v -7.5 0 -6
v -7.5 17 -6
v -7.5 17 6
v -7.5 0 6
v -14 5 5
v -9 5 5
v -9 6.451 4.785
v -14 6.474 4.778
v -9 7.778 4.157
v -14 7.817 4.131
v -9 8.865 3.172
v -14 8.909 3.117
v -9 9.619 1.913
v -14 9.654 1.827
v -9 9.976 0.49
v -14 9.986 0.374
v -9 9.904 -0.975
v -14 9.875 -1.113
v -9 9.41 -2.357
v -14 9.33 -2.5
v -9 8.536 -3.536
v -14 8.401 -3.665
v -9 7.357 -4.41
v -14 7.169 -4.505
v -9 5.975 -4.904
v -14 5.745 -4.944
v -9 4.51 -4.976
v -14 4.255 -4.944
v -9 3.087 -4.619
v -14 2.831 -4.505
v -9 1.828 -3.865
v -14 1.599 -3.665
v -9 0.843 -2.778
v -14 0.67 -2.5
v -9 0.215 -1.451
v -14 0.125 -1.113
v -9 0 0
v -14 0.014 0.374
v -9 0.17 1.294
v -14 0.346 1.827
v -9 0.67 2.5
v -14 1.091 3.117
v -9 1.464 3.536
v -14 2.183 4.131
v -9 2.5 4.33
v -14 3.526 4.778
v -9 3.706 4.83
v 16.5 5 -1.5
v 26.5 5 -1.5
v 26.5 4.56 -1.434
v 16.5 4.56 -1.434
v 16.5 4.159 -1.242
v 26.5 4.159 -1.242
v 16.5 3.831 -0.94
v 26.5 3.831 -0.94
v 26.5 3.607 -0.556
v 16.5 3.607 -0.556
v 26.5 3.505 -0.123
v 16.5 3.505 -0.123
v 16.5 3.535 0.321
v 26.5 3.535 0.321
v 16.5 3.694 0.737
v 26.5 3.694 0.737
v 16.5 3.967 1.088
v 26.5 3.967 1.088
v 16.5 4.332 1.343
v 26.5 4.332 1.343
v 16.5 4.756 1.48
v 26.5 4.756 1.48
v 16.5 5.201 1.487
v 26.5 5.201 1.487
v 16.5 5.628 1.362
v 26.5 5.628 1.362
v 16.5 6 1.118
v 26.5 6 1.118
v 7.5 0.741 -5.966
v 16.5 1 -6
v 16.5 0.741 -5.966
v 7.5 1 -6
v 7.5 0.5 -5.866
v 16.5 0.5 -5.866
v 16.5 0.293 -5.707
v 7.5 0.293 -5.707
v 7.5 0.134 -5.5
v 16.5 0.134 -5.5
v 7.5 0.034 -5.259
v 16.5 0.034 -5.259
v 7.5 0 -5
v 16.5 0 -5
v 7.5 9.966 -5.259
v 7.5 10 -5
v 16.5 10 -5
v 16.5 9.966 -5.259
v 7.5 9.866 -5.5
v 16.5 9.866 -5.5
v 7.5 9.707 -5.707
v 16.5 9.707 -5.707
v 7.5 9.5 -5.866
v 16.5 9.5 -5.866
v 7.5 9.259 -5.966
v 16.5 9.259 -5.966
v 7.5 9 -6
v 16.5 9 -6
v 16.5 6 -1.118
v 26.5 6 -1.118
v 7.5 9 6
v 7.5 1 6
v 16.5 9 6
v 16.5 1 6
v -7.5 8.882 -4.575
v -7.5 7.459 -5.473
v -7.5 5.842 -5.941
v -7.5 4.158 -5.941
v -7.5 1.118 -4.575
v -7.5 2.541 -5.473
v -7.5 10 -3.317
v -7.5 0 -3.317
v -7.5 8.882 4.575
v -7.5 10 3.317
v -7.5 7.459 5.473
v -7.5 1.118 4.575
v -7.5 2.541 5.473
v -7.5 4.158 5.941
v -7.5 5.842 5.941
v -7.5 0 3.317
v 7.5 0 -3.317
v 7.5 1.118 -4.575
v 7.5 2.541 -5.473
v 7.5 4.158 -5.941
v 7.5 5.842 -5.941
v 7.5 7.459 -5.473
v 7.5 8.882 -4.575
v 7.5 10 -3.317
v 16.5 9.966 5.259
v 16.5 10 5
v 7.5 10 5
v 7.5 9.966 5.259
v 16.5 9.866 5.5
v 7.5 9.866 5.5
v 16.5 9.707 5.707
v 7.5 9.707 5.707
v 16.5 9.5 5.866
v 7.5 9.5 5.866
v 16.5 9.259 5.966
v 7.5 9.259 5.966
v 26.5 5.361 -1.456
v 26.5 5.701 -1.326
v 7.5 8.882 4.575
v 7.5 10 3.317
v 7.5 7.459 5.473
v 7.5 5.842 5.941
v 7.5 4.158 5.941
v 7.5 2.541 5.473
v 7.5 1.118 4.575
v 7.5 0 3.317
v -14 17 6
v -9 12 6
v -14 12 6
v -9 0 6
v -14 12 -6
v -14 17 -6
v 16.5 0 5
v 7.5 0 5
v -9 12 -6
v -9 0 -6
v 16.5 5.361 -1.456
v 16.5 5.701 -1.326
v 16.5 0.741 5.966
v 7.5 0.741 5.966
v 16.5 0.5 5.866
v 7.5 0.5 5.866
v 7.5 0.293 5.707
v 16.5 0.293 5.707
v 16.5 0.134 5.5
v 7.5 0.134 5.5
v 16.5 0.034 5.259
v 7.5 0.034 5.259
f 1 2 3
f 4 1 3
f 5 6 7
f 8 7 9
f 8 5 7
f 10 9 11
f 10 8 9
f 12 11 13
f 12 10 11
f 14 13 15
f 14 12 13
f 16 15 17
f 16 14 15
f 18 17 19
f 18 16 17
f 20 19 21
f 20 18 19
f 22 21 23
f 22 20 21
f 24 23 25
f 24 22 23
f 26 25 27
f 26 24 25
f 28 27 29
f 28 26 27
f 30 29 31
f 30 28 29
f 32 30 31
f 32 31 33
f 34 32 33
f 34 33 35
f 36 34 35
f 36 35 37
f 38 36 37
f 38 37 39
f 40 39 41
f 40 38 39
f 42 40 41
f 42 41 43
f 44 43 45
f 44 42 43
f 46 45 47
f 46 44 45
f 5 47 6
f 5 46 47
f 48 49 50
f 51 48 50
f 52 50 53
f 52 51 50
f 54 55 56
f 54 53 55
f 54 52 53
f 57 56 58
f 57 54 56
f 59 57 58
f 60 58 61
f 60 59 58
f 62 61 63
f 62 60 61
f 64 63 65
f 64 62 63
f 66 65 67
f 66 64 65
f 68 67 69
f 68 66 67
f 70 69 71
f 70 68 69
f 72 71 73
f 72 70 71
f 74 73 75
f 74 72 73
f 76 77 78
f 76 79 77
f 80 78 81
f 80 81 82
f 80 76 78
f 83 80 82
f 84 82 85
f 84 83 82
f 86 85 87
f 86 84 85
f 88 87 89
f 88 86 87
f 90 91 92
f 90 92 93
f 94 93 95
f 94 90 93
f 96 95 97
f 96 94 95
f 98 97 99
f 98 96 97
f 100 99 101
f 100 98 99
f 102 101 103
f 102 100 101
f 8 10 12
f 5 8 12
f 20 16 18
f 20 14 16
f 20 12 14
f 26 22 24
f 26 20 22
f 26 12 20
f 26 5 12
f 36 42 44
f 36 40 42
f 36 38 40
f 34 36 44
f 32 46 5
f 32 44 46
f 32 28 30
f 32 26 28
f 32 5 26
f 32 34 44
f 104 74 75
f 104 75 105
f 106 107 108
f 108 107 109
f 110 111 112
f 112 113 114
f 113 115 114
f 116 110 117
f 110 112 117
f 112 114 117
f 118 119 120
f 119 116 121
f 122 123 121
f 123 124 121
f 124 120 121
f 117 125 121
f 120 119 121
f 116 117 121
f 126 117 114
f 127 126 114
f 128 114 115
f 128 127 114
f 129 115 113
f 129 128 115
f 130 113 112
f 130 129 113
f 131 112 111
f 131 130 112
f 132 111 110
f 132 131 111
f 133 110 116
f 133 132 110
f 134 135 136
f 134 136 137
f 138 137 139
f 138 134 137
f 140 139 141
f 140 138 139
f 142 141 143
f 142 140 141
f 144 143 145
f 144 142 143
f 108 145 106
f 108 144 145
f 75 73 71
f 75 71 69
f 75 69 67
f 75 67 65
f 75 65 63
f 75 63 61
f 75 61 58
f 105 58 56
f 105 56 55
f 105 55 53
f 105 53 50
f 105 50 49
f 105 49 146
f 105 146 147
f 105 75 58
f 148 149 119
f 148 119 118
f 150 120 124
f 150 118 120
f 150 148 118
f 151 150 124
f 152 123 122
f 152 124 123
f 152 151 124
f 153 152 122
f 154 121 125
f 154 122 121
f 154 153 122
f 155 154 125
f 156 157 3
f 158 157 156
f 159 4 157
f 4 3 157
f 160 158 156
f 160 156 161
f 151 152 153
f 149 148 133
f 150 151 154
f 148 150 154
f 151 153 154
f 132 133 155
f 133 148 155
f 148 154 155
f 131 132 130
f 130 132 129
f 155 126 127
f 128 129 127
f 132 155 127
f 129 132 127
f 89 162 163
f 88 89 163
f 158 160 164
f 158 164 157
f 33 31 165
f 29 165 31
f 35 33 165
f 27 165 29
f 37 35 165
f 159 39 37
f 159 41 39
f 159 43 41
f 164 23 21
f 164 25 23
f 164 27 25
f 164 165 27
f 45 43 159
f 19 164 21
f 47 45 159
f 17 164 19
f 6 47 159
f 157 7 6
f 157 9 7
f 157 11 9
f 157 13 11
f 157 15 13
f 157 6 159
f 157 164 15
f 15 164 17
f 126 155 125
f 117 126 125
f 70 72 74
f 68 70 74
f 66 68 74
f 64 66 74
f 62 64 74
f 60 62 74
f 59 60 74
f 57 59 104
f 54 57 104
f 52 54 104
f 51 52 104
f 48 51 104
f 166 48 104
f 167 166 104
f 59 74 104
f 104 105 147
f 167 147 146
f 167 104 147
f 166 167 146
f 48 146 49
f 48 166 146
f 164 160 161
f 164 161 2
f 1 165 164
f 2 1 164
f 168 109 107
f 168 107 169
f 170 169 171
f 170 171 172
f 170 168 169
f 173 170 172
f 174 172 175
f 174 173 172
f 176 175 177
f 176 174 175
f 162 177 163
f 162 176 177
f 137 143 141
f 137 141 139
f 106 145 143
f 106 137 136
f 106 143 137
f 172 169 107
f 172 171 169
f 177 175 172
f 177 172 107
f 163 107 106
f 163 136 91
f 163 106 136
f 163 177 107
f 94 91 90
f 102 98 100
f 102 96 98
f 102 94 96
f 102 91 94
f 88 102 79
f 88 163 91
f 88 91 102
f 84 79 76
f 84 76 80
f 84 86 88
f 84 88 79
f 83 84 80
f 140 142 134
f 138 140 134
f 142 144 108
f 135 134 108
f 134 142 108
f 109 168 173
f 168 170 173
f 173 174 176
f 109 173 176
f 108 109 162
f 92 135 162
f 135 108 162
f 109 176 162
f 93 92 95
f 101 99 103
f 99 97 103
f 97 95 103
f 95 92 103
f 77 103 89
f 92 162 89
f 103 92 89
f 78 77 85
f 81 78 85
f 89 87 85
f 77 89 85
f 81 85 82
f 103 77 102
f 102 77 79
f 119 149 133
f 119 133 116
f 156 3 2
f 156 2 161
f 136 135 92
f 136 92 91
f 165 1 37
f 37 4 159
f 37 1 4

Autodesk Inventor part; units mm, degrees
ref_plane "YZ Plane" through (0, 0, 0) normal (1, 0, 0) x (0, 1, 0)
ref_plane "XZ Plane" through (0, 0, 0) normal (0, 1, 0) x (-1, 0, 0)
ref_plane "XY Plane" through (0, 0, 0) normal (0, 0, 1) x (1, 0, 0)
sketch "Sketch1" plane through (0, 0, 0) normal (0, 1, 0) x (-1, 0, 0)
  line L0 (7.5, 6) -> (-7.5, 6)
  line L1 (-7.5, 6) -> (-7.5, -6)
  line L2 (-7.5, -6) -> (7.5, -6)
  line L3 (7.5, -6) -> (7.5, 6)
  line L4 (7.5, 6) -> (-7.5, -6) construction
  line L5 (-7.5, 6) -> (7.5, -6) construction
  line L6 (7.5, 6) -> (14, 6)
  line L7 (14, 6) -> (14, -6)
  line L8 (14, -6) -> (7.5, -6)
  line L9 (7.5, -6) -> (7.5, 6)
  line L10 (-7.5, 6) -> (-16.5, 6)
  line L11 (-16.5, 6) -> (-16.5, -6)
  line L12 (-16.5, -6) -> (-7.5, -6)
  line L13 (-7.5, -6) -> (-7.5, 6)
  point P0 (0, 0)
  dimension "d0" = 6.5
  dimension "d1" = 12
  dimension "d2" = 9
  dimension "d3" = 21.5
extrude "Extrusion1" add sketch "Sketch1" along normal blind 17 contours L6 L7 L8 L3
extrude "Extrusion2" add sketch "Sketch1" along normal blind 10 separate body contours L3 L2 L1 L0
extrude "Extrusion3" add sketch "Sketch1" along normal blind 10 separate body contours L1 L12 L11 L10
sketch "Sketch2" plane through (16.5, 0, 6) normal (1, 0, 0) x (0, 0, -1)
  circle A0 centre (6, 5) radius 1.5
  line L0 (0, 0) -> (0, 17) projected
  line L1 (4.882, 6) -> (7.118, 6)
  line L2 (12, 10) -> (0, 10) projected
  line L3 (12, 0) -> (0, 0) projected
  line L4 (0, 10) -> (0, 0)
  point P0 (6, 0)
  point P1 (0, 5)
  point P2 (6, 6)
  dimension "d10" = 3
  dimension "d11" = 1
  dimension "d12" = 5
extrude "Extrusion4" add sketch "Sketch2" along normal blind 10 separate body contours A0 L1 picked at (6.0594, 5.1702)
sketch "Sketch3" plane through (-14, 0, -6) normal (-1, 0, 0) x (0, 0, 1)
  line L0 (0, 0) -> (0, 17) projected
  line L1 (0, 12) -> (12, 12)
  line L2 (12, 0) -> (12, 17) projected
  line L3 (0, 17) -> (12, 17) projected
  arc A0 (4.882, 6) -> (7.118, 6) centre (6, 5) ccw projected
  circle A1 centre (6, 5) radius 5
  line L4 (0, 12) -> (0, 0)
  line L5 (12, 0) -> (12, 12)
  line L6 (12, 12) -> (12, 0)
  line L7 (0, 0) -> (12, 0)
  line L8 (0, 0) -> (0, 12)
  point P0 (6, 0)
  point P1 (6, 0)
  dimension "d15" = 5
  dimension "d16" = 10
extrude "Extrusion5" cut sketch "Sketch3" against normal blind 5 contours L0 L1 L2 L7 bodies 1
fillet "Fillet1" radius 1 4 edges at (12, 0, 6) (12, 10, 6) (12, 10, -6) (12, 0, -6)
sketch "Sketch4" plane through (7.5, 0, 6) normal (1, 0, 0) x (0, 0, -1)
  arc A0 (4.882, 6) -> (7.118, 6) centre (6, 5) ccw projected
  circle A1 centre (6, 5) radius 6
  line L0 (0, 0) -> (0, 17) projected
  line L1 (0, 10.0481) -> (0, 0)
  line L2 (0, 0) -> (13.8807, 0)
  line L3 (0, 0) -> (12, 0)
  line L4 (12, 0) -> (12, 17) projected
  line L5 (0, 10) -> (12, 10) projected
  line L6 (0, 0) -> (12, 0) projected
  line L7 (12, 0) -> (12, 10) projected
  line L8 (0, 10) -> (12, 10) projected
  line L9 (0, 0) -> (0, 10) projected
  point P0 (6, 0)
  point P1 (2.6834, 10)
  point P2 (0, 5)
  point P3 (2.6834, 0)
  point P4 (9.3166, 10)
  point P5 (12, 5)
  point P6 (9.3166, 0)
  dimension "d20" = 12
extrude "Extrusion6" cut sketch "Sketch4" against normal up to next contours L4 L2 A1 | A1 L5 L4 | A1 L0 L5 | L2 L0 A1 bodies 2
equation "\"d12\" = 0.5 * d8"
equation "\"d8\" = 10"
properties part number "motor"
